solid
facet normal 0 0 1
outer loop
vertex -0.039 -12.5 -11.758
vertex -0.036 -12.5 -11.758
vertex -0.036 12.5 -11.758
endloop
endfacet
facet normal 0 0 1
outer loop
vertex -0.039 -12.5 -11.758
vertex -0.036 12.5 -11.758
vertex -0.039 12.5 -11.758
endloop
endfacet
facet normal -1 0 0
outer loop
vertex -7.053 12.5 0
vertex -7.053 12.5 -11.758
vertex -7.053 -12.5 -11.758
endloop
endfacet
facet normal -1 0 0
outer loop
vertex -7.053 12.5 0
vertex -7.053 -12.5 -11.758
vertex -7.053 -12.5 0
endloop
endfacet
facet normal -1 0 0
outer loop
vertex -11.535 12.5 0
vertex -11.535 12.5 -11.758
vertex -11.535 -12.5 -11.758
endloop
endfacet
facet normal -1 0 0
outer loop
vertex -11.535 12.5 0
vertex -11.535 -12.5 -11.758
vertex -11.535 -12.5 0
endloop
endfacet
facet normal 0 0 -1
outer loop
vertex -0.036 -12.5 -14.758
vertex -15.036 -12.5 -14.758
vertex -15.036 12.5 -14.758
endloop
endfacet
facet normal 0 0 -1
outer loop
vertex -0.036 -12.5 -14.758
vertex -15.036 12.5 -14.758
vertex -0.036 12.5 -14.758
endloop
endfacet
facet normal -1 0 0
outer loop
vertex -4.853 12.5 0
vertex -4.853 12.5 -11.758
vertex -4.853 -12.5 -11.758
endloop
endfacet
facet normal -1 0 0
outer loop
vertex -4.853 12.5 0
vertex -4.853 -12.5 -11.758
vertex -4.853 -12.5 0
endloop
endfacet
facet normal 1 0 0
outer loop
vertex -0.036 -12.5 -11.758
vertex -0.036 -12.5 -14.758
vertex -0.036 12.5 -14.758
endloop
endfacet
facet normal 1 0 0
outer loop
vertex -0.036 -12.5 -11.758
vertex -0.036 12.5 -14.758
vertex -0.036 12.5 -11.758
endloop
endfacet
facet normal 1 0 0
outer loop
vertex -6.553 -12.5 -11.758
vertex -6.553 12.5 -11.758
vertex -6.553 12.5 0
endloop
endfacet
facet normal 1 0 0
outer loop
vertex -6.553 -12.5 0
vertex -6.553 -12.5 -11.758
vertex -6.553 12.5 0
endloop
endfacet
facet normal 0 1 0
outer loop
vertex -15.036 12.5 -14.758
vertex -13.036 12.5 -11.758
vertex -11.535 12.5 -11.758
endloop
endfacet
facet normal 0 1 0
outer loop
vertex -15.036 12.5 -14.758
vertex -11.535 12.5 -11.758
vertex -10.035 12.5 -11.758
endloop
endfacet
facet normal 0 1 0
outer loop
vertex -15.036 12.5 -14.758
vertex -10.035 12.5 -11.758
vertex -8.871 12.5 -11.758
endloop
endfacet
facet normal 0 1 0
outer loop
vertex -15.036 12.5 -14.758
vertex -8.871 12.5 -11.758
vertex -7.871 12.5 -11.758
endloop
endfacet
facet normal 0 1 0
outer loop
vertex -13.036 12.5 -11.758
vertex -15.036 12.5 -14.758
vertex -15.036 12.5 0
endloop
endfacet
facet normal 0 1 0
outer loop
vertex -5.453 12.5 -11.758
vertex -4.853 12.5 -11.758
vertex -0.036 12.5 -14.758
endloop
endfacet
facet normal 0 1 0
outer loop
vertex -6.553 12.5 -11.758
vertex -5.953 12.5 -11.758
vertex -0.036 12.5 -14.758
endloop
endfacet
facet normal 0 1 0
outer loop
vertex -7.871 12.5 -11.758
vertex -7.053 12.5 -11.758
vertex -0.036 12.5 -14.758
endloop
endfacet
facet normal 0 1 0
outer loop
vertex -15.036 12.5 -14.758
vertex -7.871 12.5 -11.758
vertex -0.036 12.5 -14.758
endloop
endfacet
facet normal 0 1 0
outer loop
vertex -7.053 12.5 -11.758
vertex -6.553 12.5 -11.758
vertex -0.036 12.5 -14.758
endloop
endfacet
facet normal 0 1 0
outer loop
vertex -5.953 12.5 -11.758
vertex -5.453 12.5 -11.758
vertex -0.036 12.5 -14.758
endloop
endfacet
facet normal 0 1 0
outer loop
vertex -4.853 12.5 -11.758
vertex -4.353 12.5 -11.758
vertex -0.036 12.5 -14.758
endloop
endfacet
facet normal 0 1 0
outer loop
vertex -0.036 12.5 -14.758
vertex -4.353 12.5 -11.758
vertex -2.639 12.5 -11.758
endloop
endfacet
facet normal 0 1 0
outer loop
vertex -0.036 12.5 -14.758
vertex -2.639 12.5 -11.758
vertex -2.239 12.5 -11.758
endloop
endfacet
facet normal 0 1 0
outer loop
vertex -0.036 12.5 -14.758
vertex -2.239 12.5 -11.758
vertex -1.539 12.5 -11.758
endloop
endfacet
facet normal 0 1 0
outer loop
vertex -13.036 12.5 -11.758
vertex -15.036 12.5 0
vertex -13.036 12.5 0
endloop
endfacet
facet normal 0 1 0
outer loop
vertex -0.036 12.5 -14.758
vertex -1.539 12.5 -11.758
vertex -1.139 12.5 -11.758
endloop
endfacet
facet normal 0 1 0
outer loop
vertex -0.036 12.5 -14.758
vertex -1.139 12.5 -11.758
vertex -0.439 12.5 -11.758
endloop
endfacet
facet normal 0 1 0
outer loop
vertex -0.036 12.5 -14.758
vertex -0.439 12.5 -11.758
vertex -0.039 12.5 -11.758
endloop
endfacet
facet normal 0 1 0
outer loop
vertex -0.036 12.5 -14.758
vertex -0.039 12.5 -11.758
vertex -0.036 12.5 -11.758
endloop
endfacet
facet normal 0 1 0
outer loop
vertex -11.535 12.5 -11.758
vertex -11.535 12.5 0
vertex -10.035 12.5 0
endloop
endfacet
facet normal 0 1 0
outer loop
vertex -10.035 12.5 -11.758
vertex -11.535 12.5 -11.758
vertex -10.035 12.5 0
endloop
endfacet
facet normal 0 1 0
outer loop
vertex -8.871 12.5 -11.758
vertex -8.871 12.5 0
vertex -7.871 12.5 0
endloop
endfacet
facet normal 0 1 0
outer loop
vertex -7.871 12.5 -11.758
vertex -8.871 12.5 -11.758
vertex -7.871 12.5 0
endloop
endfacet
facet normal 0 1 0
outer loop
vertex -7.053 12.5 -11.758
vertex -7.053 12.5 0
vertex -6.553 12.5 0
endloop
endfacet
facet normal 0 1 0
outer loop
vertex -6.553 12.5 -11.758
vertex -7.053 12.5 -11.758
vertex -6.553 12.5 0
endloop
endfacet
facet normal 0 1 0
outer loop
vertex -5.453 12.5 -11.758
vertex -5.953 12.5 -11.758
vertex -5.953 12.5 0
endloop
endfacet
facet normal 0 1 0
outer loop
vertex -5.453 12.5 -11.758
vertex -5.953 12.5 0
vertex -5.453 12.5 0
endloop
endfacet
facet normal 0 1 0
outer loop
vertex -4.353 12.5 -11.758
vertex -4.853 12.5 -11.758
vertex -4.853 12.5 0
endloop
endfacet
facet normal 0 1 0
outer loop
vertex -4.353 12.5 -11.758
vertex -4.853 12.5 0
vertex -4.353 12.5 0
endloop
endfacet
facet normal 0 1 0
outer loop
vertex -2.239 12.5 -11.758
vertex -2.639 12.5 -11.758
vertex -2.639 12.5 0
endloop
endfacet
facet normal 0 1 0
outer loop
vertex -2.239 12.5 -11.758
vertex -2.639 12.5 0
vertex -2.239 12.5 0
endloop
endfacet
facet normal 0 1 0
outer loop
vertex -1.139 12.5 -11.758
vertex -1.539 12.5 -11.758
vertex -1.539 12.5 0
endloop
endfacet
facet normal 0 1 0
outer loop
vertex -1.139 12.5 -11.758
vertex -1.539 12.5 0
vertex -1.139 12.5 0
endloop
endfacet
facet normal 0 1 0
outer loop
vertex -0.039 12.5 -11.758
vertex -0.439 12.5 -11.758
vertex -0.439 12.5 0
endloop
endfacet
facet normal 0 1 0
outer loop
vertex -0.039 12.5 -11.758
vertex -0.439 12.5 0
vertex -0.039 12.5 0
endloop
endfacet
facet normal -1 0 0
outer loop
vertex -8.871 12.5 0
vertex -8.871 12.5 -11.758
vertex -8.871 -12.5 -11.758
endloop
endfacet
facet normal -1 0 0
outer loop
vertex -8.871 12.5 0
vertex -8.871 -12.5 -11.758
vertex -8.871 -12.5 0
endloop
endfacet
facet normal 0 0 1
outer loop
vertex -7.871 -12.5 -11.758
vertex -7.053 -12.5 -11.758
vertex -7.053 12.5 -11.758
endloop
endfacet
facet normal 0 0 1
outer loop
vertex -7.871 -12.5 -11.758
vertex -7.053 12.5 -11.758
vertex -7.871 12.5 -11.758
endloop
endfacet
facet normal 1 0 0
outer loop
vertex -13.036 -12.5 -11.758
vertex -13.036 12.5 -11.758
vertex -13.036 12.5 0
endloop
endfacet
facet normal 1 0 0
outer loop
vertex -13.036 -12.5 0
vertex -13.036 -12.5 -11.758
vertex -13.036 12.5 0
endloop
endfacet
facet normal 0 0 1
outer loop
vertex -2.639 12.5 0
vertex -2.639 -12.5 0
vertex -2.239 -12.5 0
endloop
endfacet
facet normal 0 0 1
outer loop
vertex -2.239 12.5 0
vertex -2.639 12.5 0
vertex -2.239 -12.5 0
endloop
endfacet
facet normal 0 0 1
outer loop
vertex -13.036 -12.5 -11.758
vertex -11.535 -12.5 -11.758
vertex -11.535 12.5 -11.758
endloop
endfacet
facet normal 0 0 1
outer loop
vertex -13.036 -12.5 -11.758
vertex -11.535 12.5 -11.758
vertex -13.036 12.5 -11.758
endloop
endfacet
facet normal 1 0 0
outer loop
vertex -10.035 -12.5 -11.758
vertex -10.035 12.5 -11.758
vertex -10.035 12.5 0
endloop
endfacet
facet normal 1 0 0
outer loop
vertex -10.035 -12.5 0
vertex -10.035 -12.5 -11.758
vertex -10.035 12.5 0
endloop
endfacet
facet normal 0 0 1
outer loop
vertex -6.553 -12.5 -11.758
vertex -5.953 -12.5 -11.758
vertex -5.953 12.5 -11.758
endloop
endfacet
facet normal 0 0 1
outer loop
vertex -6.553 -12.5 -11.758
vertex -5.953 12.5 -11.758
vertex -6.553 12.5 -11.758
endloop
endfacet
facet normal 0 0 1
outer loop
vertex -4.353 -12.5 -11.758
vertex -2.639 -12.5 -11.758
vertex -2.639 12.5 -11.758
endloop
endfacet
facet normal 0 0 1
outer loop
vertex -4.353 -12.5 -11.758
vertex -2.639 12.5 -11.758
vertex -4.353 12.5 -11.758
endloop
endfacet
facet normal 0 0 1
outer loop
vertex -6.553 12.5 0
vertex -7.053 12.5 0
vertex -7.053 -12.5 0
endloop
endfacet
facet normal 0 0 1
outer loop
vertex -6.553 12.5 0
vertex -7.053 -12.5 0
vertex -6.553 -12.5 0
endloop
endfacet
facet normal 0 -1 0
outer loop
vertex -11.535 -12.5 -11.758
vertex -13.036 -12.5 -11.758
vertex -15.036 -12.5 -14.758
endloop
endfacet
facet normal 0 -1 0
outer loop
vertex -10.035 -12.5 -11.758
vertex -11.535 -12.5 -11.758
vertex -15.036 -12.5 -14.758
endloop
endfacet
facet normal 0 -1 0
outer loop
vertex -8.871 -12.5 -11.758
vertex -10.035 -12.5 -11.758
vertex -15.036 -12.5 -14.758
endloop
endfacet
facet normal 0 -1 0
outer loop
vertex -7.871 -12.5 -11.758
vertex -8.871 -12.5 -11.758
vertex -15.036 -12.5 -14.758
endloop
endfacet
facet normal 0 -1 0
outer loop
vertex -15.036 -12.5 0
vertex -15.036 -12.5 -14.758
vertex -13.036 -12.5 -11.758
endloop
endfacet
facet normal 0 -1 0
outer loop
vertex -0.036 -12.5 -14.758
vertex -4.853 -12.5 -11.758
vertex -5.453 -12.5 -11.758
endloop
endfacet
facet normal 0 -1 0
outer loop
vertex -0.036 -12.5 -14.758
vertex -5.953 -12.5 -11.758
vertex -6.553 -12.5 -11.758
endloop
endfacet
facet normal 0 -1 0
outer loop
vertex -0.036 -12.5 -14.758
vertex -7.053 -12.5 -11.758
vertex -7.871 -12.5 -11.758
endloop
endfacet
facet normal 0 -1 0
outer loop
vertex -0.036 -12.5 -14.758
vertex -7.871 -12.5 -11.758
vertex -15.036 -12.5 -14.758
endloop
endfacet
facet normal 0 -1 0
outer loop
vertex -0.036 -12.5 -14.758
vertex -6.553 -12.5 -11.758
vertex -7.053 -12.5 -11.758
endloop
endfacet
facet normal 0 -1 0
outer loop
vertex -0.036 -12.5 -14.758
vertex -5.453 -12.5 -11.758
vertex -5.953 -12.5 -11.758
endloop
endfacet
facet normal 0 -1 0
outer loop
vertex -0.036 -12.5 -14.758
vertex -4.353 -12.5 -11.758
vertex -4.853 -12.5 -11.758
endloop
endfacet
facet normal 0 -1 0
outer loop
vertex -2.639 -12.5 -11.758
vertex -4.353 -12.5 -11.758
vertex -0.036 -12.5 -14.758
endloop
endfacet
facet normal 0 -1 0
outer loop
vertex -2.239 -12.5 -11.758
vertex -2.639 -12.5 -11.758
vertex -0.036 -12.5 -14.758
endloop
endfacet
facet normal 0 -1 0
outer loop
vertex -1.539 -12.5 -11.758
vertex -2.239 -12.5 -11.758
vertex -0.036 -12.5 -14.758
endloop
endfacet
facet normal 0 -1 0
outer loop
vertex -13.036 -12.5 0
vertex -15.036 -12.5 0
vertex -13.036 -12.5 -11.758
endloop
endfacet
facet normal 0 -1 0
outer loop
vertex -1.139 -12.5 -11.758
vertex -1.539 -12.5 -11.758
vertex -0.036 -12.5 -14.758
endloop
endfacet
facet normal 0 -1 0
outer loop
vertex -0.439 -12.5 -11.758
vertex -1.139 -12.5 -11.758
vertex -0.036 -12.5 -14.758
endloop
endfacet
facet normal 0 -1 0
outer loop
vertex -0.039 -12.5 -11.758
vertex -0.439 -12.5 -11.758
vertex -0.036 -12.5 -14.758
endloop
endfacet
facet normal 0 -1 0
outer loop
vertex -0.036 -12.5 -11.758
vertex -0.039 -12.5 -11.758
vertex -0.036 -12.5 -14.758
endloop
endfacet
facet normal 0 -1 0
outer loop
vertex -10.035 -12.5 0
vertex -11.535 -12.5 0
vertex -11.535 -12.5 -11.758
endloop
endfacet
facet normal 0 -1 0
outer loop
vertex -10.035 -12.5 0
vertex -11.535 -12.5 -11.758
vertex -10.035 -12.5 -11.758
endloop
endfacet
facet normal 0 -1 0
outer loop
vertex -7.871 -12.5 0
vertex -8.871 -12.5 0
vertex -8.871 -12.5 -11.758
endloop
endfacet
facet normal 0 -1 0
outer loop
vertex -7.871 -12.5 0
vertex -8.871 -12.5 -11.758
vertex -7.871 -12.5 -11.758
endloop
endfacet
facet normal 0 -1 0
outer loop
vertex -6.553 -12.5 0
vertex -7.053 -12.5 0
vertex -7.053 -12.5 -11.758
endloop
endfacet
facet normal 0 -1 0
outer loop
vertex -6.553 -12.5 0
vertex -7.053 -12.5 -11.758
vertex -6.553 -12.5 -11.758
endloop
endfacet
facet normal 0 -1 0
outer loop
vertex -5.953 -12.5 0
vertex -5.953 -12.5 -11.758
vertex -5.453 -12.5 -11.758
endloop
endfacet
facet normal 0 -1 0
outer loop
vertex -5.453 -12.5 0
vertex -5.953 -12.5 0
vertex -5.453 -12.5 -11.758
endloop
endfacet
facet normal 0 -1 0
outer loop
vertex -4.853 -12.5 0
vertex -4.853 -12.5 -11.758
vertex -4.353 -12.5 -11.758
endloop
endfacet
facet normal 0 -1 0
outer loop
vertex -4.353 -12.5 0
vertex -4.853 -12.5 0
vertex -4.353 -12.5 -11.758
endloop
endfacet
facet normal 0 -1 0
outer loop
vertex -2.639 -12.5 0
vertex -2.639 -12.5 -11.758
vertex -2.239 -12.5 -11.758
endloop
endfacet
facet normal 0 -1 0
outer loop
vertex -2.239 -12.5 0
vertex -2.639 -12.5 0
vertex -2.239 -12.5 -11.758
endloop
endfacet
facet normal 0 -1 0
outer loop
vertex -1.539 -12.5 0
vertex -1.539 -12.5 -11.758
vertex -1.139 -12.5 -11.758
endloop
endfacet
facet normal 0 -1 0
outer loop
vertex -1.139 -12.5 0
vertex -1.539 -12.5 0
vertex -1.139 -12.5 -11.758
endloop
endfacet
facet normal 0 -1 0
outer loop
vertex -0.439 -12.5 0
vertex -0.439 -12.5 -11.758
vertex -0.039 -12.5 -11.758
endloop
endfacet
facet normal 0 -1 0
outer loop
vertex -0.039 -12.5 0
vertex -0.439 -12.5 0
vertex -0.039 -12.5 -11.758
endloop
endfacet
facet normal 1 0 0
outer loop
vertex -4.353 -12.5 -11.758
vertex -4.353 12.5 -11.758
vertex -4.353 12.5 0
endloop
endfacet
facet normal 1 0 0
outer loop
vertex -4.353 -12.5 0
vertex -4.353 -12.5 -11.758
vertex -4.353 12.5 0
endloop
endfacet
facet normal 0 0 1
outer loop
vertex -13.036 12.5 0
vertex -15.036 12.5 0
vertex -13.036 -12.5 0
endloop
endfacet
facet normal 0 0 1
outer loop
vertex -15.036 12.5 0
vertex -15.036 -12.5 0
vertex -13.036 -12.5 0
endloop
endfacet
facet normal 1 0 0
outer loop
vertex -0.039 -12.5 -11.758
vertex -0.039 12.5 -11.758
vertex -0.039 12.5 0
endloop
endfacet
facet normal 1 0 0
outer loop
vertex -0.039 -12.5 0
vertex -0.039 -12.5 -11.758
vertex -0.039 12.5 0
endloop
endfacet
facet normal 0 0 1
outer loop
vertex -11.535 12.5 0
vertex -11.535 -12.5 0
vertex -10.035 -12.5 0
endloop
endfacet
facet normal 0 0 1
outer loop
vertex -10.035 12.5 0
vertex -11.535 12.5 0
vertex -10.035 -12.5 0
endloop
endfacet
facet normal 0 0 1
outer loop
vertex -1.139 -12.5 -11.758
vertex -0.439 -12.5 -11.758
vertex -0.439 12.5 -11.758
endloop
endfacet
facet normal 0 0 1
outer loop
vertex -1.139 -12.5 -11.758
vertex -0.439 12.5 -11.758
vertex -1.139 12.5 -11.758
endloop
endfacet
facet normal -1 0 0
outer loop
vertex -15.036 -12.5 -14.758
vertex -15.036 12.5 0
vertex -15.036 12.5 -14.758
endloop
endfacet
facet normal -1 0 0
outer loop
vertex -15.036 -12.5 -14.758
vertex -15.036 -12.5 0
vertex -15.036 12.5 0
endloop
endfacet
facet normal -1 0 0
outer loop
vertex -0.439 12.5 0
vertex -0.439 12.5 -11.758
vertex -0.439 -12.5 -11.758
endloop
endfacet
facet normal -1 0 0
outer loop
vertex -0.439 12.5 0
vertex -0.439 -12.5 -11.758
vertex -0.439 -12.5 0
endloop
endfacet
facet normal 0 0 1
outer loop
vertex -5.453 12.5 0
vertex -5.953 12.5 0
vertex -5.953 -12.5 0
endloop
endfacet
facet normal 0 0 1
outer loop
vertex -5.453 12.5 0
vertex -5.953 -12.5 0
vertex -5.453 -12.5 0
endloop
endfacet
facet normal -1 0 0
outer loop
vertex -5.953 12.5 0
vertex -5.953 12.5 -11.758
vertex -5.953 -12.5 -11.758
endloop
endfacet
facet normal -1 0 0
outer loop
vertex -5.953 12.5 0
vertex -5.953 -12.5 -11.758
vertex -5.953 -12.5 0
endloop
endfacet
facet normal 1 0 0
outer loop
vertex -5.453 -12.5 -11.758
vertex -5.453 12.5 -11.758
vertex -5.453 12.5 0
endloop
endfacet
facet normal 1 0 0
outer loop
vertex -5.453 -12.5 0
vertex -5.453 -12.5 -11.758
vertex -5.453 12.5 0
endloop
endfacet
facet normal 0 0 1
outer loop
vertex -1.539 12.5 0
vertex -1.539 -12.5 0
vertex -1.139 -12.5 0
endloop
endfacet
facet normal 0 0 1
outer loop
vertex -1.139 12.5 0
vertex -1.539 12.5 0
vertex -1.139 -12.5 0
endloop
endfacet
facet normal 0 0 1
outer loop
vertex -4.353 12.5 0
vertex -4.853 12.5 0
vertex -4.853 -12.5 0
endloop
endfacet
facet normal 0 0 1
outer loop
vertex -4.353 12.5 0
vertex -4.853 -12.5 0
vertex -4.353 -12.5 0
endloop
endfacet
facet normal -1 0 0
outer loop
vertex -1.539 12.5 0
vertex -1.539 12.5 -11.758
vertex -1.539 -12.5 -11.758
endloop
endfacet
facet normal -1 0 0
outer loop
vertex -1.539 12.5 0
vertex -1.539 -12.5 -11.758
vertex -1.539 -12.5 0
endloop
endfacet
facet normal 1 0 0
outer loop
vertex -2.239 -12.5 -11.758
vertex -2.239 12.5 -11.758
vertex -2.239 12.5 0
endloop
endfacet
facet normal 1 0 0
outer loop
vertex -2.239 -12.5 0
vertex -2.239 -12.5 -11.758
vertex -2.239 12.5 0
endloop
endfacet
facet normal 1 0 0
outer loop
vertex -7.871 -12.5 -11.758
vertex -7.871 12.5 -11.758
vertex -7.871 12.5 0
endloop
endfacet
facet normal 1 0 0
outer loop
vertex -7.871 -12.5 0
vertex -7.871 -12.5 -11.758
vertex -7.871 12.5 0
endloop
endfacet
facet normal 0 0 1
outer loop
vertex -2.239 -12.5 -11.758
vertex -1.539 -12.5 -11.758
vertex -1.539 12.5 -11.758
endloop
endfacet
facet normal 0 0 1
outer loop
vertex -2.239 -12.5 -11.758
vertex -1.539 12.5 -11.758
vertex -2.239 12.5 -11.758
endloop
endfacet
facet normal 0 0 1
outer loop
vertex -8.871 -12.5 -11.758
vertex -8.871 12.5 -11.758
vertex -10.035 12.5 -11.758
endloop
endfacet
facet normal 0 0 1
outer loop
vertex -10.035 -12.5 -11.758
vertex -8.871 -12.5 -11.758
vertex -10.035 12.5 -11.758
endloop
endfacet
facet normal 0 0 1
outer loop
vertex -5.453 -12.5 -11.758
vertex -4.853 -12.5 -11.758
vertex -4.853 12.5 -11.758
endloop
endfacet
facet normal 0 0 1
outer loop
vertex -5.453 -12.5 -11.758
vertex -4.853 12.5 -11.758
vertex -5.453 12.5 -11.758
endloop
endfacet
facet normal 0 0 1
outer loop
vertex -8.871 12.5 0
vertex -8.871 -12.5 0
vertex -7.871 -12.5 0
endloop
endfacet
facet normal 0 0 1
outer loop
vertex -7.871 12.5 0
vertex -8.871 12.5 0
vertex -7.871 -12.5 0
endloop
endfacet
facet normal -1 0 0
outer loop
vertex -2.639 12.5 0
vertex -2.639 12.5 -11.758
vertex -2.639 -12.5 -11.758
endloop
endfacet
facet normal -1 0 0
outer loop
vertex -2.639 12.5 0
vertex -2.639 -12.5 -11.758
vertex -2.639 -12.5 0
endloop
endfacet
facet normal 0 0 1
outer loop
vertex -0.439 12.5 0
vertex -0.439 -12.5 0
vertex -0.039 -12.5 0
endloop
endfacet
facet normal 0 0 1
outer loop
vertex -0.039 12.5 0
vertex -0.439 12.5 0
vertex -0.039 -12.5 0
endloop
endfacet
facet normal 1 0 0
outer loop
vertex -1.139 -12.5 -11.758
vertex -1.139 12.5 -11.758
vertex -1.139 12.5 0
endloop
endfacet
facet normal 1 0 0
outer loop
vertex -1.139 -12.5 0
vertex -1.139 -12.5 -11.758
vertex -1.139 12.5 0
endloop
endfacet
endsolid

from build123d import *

# Parameters (mm, degrees)
F0_W     = 5.08
F0_H     = 25.4
F0_W_2   = 2.54
F0_W_3   = 3.81
F1_DEPTH = 40
F3_W     = 2
F3_H     = 11.758205078
F3_W_2   = 1.5
F3_W_3   = 1
F3_W_4   = 0.4
F3_W_5   = 0.5
F4_DEPTH = 12.5


with BuildPart() as f1:
    # F0 (on Front) → F1 (new body)
    with BuildSketch(Plane.XZ):
        Polygon((-39.5374095005, -17.8057016992), (-44.6174095005, -17.8057016992), (-44.6174095005, -22.8857016992), (56.9825904995, -22.8857016992), (56.9825904995, -17.8057016992), (51.9025904995, -17.8057016992), (40.6538585508, -17.8057016992), (38.1138585508, -17.8057016992), (25.9218535846, -17.8057016992), (22.1118535846, -17.8057016992), (8.1349273361, -17.8057016992), (3.0549273361, -17.8057016992), (-17.8261825508, -17.8057016992), (-20.3661825508, -17.8057016992), (-27.4666358256, -17.8057016992), (-31.2766358256, -17.8057016992), align=None)
        with Locations((54.4425904995, -5.1057016992)):
            Rectangle(F0_W, F0_H)
        with Locations((39.3838585508, -5.1057016992)):
            Rectangle(F0_W_2, F0_H)
        with Locations((24.0168535846, -5.1057016992)):
            Rectangle(F0_W_3, F0_H)
        with Locations((5.5949273361, -5.1057016992)):
            Rectangle(F0_W, F0_H)
        with Locations((-29.3716358256, -5.1057016992)):
            Rectangle(F0_W_3, F0_H)
        with Locations((-42.0774095005, -5.1057016992)):
            Rectangle(F0_W, F0_H)
        with Locations((-19.0961825508, -5.1057016992)):
            Rectangle(F0_W_2, F0_H)
    extrude(amount=F1_DEPTH)


with BuildPart() as f4:
    # F3 (on Front) → F4 (new body, symmetric)
    with BuildSketch(Plane.XZ):
        with Locations((-14.0355701865, -5.879102539)):
            Rectangle(F3_W, F3_H)
        Polygon((-13.0355701865, -11.758205078), (-15.0355701865, -11.758205078), (-15.0355701865, -14.758205078), (-0.0355701865, -14.758205078), (-0.0355701865, -11.758205078), (-0.0385628735, -11.758205078), (-0.4385628735, -11.758205078), (-1.1385628735, -11.758205078), (-1.5385628735, -11.758205078), (-2.2385628735, -11.758205078), (-2.6385628735, -11.758205078), (-4.3532104, -11.758205078), (-4.8532104, -11.758205078), (-5.4532104, -11.758205078), (-5.9532104, -11.758205078), (-6.5532104, -11.758205078), (-7.0532104, -11.758205078), (-7.870703689, -11.758205078), (-8.870703689, -11.758205078), (-10.0352638757, -11.758205078), (-11.5352638757, -11.758205078), align=None)
        with Locations((-10.7852638757, -5.879102539)):
            Rectangle(F3_W_2, F3_H)
        with Locations((-8.370703689, -5.879102539)):
            Rectangle(F3_W_3, F3_H)
        with Locations((-0.2385628735, -5.879102539)):
            Rectangle(F3_W_4, F3_H)
        with Locations((-6.8032104, -5.879102539)):
            Rectangle(F3_W_5, F3_H)
        with Locations((-1.3385628735, -5.879102539)):
            Rectangle(F3_W_4, F3_H)
        with Locations((-5.7032104, -5.879102539)):
            Rectangle(F3_W_5, F3_H)
        with Locations((-2.4385628735, -5.879102539)):
            Rectangle(F3_W_4, F3_H)
        with Locations((-4.6032104, -5.879102539)):
            Rectangle(F3_W_5, F3_H)
    extrude(amount=F4_DEPTH, both=True)


solid = f4.part
